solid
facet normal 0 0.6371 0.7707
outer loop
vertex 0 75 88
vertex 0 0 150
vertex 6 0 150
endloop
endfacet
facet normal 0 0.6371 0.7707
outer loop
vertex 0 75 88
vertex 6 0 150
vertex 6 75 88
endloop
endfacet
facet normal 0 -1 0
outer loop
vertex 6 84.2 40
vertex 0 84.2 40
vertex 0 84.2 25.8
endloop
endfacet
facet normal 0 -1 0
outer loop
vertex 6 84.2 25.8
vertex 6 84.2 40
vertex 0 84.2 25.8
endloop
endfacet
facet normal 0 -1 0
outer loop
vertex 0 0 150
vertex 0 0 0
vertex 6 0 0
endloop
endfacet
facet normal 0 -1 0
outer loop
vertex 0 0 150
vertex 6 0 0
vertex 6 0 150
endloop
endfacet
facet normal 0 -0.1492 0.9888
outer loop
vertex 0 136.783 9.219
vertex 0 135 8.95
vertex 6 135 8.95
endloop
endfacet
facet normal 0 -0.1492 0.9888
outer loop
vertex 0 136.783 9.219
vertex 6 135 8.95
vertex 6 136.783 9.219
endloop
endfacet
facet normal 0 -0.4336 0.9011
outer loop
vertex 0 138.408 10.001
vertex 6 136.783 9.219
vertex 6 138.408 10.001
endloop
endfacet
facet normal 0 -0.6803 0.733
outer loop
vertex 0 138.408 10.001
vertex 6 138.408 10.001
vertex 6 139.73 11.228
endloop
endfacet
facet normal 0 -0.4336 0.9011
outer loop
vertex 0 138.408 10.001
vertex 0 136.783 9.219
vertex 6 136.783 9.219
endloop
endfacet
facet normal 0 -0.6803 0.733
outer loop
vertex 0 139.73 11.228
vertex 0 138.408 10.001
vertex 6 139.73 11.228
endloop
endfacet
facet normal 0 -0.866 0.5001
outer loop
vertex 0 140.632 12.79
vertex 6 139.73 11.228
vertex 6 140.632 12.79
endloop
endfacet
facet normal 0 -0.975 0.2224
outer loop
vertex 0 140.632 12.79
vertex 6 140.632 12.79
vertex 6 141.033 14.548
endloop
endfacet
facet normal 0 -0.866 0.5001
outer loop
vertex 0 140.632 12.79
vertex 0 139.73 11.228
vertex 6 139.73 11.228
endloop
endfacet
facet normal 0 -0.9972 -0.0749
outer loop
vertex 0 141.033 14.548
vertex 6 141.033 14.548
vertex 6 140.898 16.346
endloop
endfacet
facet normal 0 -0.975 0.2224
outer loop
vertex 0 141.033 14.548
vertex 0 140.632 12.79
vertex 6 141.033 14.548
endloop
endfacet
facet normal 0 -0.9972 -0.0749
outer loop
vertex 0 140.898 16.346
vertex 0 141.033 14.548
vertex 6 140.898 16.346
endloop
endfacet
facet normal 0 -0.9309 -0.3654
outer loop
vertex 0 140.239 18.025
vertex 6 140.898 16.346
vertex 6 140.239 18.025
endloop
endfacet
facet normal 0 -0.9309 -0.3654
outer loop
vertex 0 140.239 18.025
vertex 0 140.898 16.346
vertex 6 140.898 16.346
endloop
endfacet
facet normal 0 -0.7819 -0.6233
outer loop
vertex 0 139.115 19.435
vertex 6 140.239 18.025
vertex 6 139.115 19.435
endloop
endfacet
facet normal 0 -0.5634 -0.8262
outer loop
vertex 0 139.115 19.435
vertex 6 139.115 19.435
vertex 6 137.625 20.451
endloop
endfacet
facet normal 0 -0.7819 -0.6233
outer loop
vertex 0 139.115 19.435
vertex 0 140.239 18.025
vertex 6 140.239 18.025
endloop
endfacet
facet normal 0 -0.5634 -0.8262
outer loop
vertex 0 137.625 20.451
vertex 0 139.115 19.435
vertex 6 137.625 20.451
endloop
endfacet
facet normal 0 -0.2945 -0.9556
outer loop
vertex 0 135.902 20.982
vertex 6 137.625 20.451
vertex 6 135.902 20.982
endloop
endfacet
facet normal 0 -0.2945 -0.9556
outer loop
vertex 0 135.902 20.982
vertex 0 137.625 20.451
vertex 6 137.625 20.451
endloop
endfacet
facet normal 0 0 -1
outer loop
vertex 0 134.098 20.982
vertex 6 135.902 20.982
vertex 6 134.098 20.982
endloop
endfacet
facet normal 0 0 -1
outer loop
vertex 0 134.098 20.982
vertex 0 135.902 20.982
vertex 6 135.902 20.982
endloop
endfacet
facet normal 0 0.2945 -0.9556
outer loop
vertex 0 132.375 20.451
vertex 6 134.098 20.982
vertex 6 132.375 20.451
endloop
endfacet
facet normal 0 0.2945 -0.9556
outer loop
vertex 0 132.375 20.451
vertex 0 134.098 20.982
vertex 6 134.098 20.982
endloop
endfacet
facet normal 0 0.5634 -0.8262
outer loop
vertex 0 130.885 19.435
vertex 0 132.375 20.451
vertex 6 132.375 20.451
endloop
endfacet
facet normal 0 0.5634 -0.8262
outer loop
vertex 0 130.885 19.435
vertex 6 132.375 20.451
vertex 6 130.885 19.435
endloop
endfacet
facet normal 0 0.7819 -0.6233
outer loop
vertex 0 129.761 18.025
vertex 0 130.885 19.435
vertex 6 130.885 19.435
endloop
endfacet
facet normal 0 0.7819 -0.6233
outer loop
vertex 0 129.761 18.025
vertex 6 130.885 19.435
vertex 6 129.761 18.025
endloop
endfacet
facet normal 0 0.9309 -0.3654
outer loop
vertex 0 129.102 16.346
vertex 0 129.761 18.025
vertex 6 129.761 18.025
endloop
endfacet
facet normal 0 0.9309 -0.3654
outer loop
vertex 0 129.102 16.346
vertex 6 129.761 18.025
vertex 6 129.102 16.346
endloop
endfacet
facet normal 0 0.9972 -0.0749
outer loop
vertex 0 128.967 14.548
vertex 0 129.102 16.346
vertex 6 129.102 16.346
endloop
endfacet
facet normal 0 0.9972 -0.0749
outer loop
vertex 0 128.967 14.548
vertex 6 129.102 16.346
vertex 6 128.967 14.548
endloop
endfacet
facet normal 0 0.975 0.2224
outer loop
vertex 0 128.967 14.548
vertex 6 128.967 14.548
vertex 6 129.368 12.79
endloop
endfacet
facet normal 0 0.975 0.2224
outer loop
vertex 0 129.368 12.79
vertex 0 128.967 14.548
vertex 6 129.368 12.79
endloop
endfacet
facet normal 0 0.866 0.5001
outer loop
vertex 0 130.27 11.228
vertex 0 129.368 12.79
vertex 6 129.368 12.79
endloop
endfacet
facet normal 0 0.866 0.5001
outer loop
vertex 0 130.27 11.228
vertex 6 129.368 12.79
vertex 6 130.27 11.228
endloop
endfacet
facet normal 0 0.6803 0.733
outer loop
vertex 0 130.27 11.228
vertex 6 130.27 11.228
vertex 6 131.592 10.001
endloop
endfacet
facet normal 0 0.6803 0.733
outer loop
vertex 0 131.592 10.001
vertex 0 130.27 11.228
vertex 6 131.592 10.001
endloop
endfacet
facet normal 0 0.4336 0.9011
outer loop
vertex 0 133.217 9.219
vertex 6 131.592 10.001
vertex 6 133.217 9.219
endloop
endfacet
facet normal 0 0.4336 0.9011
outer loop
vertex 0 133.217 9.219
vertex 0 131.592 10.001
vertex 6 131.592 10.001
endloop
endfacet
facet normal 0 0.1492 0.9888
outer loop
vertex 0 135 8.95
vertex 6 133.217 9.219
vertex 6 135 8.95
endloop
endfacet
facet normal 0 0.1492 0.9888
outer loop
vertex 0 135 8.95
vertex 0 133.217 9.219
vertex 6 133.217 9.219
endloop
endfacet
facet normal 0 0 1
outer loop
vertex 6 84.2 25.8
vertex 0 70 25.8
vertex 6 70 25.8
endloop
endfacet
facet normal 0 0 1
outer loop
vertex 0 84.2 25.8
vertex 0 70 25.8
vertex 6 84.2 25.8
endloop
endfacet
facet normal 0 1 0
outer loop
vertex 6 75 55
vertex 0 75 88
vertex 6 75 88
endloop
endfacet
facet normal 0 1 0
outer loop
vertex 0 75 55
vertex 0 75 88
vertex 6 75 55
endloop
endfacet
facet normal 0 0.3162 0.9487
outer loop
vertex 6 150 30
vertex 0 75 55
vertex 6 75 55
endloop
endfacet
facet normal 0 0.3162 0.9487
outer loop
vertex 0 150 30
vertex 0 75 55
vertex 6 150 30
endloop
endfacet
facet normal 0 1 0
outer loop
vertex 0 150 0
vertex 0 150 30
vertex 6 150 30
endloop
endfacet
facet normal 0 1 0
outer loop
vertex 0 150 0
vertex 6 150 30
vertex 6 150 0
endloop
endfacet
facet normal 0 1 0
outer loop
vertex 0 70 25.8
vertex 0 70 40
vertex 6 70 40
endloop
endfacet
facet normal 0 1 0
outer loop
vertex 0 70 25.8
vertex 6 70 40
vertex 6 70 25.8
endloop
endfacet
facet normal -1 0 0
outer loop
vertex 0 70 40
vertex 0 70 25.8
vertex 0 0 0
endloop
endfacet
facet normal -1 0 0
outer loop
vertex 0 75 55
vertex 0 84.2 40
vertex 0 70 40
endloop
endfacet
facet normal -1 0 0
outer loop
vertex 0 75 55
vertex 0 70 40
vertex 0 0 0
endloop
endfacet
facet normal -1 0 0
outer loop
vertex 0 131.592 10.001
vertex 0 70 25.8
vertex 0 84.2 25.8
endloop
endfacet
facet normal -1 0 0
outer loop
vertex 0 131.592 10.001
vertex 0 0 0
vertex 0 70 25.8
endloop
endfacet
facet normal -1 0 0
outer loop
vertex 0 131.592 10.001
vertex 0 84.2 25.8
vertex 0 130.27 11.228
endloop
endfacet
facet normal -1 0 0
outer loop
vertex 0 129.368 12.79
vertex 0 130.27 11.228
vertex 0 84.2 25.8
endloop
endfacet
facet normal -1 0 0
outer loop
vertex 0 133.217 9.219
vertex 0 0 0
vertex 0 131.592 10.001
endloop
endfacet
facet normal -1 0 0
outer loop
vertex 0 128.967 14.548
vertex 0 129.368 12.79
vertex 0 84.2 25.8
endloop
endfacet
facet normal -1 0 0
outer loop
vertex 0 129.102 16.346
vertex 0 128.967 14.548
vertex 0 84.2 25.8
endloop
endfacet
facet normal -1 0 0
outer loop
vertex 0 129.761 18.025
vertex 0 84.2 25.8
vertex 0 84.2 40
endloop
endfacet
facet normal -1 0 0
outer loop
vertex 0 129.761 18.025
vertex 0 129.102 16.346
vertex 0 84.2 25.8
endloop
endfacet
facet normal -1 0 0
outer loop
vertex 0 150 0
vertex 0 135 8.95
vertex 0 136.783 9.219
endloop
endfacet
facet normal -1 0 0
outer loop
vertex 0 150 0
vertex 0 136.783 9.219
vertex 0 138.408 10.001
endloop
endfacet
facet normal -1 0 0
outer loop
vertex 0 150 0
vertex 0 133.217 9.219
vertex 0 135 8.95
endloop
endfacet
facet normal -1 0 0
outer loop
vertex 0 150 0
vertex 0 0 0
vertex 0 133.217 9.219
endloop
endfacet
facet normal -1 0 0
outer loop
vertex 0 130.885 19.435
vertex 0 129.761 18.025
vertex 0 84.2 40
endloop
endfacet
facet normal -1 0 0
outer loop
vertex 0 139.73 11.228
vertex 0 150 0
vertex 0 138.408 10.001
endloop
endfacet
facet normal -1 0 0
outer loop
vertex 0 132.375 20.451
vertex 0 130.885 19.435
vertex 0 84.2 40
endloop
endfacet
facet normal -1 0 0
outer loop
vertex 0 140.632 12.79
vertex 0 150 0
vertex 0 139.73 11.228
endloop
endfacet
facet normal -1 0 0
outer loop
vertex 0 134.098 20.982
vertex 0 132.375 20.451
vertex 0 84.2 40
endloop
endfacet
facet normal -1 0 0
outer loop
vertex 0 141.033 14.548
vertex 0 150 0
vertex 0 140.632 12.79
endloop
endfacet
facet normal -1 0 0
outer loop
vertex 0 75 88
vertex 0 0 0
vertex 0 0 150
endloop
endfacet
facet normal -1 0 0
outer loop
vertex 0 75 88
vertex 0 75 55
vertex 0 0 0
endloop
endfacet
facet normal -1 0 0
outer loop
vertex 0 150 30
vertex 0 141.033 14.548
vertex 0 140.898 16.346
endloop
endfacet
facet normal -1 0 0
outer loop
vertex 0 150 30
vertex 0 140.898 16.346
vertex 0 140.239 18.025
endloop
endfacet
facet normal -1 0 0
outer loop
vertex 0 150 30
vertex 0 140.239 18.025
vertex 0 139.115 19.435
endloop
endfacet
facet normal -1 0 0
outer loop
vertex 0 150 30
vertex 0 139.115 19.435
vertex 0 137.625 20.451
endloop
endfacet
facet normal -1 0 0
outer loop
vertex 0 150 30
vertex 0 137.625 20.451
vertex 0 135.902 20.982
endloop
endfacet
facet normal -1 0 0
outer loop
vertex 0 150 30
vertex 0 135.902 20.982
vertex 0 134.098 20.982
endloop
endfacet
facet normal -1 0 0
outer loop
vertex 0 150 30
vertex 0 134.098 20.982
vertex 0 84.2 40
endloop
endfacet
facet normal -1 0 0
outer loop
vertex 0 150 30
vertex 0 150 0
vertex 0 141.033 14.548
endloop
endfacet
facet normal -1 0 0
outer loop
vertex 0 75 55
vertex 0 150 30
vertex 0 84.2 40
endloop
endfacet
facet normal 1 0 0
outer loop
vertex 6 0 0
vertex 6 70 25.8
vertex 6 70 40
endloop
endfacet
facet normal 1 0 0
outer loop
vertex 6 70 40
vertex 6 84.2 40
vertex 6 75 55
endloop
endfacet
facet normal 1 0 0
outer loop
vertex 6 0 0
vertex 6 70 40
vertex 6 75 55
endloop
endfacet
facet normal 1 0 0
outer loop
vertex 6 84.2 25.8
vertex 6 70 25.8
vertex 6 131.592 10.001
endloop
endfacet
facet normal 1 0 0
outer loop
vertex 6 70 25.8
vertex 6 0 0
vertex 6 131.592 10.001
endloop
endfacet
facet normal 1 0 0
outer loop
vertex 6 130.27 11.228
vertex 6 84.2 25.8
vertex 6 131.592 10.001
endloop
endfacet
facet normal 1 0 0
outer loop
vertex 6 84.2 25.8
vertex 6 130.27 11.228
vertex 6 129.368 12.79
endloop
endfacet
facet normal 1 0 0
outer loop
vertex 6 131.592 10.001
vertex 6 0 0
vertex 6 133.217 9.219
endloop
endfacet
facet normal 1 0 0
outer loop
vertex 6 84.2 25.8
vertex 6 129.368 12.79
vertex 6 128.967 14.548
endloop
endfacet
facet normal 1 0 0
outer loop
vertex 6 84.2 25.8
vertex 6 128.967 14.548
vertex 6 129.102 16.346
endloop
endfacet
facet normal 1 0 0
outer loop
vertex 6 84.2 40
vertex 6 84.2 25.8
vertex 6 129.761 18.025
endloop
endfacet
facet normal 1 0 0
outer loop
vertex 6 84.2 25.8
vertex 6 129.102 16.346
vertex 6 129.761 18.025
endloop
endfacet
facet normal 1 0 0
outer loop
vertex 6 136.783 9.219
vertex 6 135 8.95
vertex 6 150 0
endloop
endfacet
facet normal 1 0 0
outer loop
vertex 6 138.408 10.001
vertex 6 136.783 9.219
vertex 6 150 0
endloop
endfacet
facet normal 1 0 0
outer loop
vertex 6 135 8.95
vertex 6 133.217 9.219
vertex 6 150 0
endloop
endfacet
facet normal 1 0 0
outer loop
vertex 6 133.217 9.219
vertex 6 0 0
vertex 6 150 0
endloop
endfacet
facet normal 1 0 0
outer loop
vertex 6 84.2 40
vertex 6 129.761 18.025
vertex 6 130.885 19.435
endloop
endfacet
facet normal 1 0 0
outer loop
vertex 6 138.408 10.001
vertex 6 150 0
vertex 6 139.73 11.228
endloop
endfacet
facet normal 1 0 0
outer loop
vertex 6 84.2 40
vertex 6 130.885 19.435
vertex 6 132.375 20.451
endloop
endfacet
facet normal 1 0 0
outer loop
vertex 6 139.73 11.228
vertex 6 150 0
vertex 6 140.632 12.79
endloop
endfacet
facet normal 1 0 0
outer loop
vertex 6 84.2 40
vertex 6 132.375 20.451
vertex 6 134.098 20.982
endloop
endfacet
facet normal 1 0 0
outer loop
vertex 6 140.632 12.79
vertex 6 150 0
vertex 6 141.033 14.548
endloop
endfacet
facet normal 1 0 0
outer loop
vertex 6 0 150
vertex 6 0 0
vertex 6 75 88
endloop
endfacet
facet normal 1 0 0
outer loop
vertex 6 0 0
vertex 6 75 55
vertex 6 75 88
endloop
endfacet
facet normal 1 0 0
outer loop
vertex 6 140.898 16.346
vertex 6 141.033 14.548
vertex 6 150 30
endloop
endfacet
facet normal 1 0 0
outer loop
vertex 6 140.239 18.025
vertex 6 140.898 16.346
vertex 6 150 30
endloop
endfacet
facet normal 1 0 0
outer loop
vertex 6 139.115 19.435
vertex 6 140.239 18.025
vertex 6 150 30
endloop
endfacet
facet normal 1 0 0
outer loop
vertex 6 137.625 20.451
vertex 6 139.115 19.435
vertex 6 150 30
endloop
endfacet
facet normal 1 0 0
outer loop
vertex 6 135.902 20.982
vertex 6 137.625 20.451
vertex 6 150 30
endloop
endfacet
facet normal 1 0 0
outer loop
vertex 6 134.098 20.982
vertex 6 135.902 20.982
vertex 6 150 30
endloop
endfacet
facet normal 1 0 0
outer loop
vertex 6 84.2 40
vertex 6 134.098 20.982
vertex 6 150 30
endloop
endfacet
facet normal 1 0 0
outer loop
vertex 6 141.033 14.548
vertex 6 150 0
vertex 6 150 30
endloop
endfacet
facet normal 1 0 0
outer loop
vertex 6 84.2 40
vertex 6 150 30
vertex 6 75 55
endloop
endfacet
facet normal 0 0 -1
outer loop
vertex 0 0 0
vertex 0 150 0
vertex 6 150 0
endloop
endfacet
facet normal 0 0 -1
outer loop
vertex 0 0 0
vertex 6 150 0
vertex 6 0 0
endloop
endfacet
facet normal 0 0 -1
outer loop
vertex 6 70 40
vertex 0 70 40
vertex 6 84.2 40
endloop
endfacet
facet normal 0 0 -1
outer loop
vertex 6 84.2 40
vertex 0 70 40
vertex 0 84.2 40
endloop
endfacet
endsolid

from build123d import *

# Parameters (mm, degrees)
SKETCH1_R           = 6.05
SKETCH1_W           = 14.2
SKETCH1_H           = 14.2
BOSS_EXTRUDE1_DEPTH = 6


with BuildPart() as part:
    # Sketch1 → Boss-Extrude1 (new body)
    with BuildSketch(Plane(origin=(0, 0, 0), x_dir=(0, 0, -1), z_dir=(1, 0, 0))):
        Polygon((-150, 0), (-88, 75), (-55, 75), (-30, 150), (0, 150), (0, 0), align=None)
        with Locations((-15, 135)):
            Circle(SKETCH1_R, mode=Mode.SUBTRACT)
        with Locations((-32.9, 77.1)):
            Rectangle(SKETCH1_W, SKETCH1_H, mode=Mode.SUBTRACT)
    extrude(amount=BOSS_EXTRUDE1_DEPTH)


solid = part.part
